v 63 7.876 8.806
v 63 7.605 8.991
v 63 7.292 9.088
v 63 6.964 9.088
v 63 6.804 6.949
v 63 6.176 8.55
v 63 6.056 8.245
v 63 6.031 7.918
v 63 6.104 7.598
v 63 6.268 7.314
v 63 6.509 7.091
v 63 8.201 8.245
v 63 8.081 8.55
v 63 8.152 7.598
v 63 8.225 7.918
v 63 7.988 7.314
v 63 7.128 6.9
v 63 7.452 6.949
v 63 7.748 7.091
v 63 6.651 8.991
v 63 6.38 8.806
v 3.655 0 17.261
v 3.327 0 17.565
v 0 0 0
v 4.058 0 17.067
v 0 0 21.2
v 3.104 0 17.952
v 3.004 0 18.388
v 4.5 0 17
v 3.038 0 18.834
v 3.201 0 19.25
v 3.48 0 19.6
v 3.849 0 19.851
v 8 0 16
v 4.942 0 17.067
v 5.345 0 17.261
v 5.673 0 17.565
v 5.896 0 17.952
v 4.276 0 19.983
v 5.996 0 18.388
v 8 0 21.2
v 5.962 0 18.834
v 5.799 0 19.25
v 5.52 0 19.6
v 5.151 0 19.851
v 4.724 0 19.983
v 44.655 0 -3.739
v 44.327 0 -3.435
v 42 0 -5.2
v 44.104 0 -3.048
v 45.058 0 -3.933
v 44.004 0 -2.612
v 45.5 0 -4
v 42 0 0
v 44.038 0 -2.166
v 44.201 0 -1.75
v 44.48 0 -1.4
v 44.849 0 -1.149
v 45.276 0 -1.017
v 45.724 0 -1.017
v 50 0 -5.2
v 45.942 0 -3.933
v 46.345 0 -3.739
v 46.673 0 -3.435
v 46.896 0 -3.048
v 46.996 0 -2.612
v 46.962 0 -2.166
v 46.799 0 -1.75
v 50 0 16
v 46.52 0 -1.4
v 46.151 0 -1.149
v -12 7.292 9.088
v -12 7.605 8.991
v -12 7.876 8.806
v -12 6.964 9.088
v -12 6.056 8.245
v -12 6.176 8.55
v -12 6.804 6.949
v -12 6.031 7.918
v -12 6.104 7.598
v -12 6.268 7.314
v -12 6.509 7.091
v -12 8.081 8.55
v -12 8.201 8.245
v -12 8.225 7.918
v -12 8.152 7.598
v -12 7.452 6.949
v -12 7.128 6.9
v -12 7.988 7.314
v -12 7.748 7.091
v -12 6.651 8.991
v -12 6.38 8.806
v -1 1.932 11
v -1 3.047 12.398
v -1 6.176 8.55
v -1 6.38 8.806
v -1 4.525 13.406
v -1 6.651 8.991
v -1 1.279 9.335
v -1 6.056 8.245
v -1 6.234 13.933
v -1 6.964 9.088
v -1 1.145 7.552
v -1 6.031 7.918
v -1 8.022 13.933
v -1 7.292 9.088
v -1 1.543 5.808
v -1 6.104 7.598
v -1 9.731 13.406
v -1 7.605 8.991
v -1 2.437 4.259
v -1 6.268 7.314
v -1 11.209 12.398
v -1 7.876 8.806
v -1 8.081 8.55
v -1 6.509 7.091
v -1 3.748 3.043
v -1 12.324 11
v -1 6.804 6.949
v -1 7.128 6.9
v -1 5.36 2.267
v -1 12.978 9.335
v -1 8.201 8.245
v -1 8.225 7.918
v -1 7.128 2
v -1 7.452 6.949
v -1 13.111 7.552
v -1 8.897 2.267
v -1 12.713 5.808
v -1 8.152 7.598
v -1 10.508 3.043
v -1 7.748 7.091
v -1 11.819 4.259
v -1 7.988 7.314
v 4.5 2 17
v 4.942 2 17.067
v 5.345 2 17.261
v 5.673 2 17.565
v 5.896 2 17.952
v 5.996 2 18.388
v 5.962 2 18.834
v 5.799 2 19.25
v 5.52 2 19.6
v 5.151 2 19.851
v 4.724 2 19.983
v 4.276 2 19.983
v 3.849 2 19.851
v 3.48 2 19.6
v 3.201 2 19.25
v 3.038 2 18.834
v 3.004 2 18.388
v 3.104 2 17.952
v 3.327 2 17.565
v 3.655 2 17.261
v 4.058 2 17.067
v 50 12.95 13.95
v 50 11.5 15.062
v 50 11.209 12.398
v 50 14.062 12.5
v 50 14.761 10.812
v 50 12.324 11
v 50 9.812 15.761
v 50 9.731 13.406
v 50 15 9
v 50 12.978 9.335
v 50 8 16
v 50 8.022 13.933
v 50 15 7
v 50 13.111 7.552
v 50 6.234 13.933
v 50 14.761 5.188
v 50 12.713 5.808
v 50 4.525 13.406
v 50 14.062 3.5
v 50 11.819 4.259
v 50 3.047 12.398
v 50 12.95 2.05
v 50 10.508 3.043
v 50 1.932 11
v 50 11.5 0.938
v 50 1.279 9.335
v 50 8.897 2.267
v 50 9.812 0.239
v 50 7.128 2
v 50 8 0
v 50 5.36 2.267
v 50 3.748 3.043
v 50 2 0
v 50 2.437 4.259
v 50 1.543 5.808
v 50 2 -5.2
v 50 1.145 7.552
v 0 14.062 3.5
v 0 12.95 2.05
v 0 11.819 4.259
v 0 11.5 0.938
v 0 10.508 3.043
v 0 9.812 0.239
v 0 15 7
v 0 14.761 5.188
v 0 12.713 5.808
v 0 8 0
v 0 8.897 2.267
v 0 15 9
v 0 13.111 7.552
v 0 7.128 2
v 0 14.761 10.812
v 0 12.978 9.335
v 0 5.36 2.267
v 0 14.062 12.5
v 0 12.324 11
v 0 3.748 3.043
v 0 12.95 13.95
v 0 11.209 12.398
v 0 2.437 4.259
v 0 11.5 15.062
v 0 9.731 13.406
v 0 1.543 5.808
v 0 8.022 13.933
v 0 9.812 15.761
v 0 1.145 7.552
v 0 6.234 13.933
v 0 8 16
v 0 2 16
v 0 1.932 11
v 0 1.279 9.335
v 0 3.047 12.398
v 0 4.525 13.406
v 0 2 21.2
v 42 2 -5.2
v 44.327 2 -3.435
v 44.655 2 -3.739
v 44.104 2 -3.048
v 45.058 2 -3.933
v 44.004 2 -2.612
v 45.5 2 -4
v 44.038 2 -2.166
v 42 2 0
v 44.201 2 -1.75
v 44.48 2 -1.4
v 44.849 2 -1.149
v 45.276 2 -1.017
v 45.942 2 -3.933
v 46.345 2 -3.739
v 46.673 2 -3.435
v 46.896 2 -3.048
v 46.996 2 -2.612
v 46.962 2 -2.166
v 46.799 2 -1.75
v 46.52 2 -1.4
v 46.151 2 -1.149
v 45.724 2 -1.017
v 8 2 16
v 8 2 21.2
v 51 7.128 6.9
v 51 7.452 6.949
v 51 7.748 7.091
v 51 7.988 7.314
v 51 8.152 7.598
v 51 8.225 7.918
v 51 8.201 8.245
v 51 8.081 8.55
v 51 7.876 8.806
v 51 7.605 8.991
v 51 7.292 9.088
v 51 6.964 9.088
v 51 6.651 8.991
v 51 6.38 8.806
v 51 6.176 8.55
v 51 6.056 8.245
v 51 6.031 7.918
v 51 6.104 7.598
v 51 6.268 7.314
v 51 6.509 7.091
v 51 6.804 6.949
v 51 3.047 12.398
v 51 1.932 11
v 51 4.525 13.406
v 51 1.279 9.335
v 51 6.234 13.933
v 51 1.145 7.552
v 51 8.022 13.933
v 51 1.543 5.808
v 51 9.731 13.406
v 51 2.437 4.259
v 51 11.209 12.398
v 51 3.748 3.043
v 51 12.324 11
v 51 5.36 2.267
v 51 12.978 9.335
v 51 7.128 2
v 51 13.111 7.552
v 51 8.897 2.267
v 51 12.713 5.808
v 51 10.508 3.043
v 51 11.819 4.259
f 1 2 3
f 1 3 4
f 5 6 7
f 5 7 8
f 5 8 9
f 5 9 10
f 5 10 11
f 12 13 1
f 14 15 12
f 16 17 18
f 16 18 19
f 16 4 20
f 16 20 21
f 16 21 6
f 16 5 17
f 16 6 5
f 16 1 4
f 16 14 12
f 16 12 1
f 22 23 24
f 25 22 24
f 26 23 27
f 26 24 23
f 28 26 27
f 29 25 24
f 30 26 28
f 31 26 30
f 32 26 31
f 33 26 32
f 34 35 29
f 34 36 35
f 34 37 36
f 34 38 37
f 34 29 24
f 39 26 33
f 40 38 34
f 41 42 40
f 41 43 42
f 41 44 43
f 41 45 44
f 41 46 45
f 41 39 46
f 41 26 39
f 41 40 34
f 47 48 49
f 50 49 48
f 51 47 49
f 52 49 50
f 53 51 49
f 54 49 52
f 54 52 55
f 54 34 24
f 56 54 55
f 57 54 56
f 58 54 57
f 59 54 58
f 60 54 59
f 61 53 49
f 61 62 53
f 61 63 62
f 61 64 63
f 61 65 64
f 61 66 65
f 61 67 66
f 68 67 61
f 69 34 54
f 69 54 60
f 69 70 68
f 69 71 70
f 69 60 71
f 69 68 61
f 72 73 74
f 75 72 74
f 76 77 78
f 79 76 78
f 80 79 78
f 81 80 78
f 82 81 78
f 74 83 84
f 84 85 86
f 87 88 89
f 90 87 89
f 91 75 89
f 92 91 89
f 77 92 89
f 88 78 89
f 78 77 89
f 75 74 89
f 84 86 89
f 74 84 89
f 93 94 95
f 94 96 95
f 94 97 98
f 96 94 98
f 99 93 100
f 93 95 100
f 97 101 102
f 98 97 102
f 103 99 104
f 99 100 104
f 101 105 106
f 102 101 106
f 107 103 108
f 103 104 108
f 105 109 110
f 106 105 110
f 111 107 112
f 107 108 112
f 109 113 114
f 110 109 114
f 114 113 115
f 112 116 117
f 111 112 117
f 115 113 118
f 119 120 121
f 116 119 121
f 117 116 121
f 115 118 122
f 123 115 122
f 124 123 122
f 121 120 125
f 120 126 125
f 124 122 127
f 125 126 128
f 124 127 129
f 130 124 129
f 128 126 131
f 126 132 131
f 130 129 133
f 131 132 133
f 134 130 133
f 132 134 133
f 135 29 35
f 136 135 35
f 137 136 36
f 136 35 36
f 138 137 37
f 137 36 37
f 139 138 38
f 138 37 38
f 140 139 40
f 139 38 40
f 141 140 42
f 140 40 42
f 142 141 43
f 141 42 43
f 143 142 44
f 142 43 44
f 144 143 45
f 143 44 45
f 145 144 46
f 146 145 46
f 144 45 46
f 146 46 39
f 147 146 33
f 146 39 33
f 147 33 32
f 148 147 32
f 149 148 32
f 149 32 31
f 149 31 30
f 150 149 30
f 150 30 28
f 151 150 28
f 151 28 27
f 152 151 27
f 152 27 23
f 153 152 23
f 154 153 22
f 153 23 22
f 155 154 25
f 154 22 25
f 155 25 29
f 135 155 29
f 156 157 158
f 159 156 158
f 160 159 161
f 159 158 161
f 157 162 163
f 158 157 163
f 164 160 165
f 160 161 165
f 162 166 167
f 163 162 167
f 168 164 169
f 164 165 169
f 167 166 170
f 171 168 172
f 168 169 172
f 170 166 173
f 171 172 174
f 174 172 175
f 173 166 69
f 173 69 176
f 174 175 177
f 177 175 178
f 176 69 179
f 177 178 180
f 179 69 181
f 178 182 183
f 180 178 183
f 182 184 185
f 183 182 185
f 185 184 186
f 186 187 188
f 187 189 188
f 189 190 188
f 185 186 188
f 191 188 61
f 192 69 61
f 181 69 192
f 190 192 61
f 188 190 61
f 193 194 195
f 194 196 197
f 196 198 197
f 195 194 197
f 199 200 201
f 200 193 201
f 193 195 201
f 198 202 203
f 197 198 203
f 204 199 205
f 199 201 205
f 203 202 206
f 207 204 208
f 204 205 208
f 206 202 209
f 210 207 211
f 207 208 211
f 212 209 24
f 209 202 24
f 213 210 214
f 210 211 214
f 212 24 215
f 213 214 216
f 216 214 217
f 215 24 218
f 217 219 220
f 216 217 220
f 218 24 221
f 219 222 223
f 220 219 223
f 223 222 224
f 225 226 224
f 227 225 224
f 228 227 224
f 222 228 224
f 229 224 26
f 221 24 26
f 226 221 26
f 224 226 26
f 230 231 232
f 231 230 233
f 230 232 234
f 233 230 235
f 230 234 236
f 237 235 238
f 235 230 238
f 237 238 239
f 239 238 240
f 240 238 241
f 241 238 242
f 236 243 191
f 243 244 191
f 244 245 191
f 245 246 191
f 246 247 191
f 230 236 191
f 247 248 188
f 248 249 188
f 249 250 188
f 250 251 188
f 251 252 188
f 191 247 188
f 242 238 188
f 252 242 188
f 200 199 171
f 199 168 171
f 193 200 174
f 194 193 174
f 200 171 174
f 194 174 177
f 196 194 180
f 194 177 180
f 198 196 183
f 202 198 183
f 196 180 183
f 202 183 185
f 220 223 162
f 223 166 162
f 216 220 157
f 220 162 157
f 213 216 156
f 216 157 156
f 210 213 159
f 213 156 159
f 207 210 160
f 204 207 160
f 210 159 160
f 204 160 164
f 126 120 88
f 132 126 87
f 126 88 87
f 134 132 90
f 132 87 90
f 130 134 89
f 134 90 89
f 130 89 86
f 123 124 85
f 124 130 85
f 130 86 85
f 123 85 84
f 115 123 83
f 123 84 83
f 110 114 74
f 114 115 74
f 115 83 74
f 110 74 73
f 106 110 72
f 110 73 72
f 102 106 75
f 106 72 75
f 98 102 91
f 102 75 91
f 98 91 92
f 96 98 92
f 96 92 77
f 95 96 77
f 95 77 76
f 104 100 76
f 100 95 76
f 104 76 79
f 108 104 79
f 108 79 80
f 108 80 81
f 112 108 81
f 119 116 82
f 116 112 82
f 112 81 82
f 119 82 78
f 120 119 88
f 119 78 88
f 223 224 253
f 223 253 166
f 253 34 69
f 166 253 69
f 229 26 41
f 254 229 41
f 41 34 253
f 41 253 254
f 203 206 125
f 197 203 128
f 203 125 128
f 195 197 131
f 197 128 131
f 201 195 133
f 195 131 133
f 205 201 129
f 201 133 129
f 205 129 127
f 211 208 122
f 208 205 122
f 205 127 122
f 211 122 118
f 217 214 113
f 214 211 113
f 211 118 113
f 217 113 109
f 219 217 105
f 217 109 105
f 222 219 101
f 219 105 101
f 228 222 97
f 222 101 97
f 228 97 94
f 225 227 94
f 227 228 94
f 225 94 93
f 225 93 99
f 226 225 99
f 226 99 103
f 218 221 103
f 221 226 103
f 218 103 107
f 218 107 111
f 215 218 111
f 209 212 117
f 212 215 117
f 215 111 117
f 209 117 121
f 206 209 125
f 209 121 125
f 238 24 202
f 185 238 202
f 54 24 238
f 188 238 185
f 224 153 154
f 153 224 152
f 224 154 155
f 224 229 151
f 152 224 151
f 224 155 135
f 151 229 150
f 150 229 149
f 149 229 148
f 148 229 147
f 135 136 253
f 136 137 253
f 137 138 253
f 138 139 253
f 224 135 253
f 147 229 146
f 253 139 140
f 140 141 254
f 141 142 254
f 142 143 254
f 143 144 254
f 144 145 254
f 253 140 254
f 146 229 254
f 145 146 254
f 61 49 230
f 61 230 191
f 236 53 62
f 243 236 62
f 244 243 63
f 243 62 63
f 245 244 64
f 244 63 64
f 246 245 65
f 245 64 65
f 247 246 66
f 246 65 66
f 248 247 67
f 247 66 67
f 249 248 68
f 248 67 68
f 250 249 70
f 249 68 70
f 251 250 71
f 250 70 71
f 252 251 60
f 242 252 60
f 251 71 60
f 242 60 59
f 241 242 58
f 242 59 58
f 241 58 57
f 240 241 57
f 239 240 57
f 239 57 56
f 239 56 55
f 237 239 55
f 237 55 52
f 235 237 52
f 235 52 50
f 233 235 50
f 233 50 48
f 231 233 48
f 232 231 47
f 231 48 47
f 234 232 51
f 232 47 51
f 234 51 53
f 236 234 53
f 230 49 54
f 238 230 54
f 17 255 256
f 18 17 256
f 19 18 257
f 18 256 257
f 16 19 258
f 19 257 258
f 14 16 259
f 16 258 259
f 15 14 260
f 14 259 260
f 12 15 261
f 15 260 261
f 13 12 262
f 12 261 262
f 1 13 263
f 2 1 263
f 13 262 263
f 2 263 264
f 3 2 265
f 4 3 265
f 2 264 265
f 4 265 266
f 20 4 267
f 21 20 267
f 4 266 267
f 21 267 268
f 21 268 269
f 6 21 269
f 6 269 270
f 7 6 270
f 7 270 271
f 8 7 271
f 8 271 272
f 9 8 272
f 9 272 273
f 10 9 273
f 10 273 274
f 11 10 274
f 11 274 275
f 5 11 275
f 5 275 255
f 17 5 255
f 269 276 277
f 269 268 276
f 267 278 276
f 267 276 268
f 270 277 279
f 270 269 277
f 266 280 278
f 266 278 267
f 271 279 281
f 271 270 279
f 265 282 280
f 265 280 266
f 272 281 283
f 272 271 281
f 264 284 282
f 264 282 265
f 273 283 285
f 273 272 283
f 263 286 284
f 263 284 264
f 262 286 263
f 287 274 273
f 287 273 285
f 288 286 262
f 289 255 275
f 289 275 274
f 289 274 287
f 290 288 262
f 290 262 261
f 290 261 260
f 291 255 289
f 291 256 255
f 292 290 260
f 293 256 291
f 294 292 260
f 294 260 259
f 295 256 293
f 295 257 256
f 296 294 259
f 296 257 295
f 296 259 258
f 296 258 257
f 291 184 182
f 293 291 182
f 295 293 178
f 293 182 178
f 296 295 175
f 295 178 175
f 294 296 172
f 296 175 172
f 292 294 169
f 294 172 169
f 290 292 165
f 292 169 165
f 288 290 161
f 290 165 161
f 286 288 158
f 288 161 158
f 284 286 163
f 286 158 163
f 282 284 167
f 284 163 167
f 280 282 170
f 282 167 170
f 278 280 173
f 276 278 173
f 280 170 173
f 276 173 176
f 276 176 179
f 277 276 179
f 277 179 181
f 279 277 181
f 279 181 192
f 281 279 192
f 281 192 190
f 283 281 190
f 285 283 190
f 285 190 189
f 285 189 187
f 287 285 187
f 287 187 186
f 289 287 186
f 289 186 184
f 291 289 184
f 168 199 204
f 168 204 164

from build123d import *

# Parameters (mm, degrees)
SKETCH_1_W           = 50
SKETCH_1_H           = 16
EXTRUDE_1_DEPTH      = 15
SKETCH_2_W           = 8
SKETCH_2_H           = 5.2
SKETCH_2_R           = 1.5
EXTRUDE_2_DEPTH      = 2
FILLET_1_R           = 7
EXTRUDE_3_DEPTH      = 1
EXTRUDE_3_DEPTH_BACK = 51
SKETCH_3_R           = 6
EXTRUDE_4_DEPTH      = 12
EXTRUDE_4_DEPTH_BACK = 63
SKETCH_4_R           = 1.1


with BuildPart() as part:
    # Эскиз1 → Бобышка-Вытянуть1 (new body)
    with BuildSketch(Plane(origin=(0, 0, 0), x_dir=(1, 0, 0), z_dir=(0, 1, 0))):
        with Locations((25, -8)):
            Rectangle(SKETCH_1_W, SKETCH_1_H)
    extrude(amount=EXTRUDE_1_DEPTH)

    # Эскиз2 → Бобышка-Вытянуть2 (add)
    # profile 1 of 2: a face of its own
    with BuildSketch(Plane.XZ):
        with Locations((4, 18.6)):
            Rectangle(SKETCH_2_W, SKETCH_2_H)
        with Locations(Location((4.5, 18.5, 0), (0, 0, 270))):
            Circle(SKETCH_2_R, mode=Mode.SUBTRACT)
    # profile 2 of 2: a face of its own
    with BuildSketch(Plane.XZ):
        with Locations((46, -2.6)):
            Rectangle(SKETCH_2_W, SKETCH_2_H)
        with Locations(Location((45.5, -2.5, 0), (0, 0, 270))):
            Circle(SKETCH_2_R, mode=Mode.SUBTRACT)
    extrude(amount=-EXTRUDE_2_DEPTH)

    # Скругление1
    fillet_1_edges = [part.edges().sort_by_distance(p)[0] for p in [
        (25, 15, 0),
        (25, 15, 16),
    ]]
    fillet(fillet_1_edges, radius=FILLET_1_R)

    # Эскиз3 → Бобышка-Вытянуть3 (add, two sides: drawn at the far end of the back side and taken through both)
    with BuildSketch(Plane(origin=(50, 0, 0), x_dir=(0, 0, -1), z_dir=(1, 0, 0)).offset(-EXTRUDE_3_DEPTH_BACK)):
        with Locations((-8, 7.128166943)):
            Circle(SKETCH_3_R)
    extrude(amount=EXTRUDE_3_DEPTH + EXTRUDE_3_DEPTH_BACK)

    # Эскиз4 → Бобышка-Вытянуть4 (add, two sides: drawn at the far end of the back side and taken through both)
    with BuildSketch(Plane(origin=(51, 0, 0), x_dir=(0, 0, -1), z_dir=(1, 0, 0)).offset(-EXTRUDE_4_DEPTH_BACK)):
        with Locations((-8, 7.128166943)):
            Circle(SKETCH_4_R)
    extrude(amount=EXTRUDE_4_DEPTH + EXTRUDE_4_DEPTH_BACK)


solid = part.part
